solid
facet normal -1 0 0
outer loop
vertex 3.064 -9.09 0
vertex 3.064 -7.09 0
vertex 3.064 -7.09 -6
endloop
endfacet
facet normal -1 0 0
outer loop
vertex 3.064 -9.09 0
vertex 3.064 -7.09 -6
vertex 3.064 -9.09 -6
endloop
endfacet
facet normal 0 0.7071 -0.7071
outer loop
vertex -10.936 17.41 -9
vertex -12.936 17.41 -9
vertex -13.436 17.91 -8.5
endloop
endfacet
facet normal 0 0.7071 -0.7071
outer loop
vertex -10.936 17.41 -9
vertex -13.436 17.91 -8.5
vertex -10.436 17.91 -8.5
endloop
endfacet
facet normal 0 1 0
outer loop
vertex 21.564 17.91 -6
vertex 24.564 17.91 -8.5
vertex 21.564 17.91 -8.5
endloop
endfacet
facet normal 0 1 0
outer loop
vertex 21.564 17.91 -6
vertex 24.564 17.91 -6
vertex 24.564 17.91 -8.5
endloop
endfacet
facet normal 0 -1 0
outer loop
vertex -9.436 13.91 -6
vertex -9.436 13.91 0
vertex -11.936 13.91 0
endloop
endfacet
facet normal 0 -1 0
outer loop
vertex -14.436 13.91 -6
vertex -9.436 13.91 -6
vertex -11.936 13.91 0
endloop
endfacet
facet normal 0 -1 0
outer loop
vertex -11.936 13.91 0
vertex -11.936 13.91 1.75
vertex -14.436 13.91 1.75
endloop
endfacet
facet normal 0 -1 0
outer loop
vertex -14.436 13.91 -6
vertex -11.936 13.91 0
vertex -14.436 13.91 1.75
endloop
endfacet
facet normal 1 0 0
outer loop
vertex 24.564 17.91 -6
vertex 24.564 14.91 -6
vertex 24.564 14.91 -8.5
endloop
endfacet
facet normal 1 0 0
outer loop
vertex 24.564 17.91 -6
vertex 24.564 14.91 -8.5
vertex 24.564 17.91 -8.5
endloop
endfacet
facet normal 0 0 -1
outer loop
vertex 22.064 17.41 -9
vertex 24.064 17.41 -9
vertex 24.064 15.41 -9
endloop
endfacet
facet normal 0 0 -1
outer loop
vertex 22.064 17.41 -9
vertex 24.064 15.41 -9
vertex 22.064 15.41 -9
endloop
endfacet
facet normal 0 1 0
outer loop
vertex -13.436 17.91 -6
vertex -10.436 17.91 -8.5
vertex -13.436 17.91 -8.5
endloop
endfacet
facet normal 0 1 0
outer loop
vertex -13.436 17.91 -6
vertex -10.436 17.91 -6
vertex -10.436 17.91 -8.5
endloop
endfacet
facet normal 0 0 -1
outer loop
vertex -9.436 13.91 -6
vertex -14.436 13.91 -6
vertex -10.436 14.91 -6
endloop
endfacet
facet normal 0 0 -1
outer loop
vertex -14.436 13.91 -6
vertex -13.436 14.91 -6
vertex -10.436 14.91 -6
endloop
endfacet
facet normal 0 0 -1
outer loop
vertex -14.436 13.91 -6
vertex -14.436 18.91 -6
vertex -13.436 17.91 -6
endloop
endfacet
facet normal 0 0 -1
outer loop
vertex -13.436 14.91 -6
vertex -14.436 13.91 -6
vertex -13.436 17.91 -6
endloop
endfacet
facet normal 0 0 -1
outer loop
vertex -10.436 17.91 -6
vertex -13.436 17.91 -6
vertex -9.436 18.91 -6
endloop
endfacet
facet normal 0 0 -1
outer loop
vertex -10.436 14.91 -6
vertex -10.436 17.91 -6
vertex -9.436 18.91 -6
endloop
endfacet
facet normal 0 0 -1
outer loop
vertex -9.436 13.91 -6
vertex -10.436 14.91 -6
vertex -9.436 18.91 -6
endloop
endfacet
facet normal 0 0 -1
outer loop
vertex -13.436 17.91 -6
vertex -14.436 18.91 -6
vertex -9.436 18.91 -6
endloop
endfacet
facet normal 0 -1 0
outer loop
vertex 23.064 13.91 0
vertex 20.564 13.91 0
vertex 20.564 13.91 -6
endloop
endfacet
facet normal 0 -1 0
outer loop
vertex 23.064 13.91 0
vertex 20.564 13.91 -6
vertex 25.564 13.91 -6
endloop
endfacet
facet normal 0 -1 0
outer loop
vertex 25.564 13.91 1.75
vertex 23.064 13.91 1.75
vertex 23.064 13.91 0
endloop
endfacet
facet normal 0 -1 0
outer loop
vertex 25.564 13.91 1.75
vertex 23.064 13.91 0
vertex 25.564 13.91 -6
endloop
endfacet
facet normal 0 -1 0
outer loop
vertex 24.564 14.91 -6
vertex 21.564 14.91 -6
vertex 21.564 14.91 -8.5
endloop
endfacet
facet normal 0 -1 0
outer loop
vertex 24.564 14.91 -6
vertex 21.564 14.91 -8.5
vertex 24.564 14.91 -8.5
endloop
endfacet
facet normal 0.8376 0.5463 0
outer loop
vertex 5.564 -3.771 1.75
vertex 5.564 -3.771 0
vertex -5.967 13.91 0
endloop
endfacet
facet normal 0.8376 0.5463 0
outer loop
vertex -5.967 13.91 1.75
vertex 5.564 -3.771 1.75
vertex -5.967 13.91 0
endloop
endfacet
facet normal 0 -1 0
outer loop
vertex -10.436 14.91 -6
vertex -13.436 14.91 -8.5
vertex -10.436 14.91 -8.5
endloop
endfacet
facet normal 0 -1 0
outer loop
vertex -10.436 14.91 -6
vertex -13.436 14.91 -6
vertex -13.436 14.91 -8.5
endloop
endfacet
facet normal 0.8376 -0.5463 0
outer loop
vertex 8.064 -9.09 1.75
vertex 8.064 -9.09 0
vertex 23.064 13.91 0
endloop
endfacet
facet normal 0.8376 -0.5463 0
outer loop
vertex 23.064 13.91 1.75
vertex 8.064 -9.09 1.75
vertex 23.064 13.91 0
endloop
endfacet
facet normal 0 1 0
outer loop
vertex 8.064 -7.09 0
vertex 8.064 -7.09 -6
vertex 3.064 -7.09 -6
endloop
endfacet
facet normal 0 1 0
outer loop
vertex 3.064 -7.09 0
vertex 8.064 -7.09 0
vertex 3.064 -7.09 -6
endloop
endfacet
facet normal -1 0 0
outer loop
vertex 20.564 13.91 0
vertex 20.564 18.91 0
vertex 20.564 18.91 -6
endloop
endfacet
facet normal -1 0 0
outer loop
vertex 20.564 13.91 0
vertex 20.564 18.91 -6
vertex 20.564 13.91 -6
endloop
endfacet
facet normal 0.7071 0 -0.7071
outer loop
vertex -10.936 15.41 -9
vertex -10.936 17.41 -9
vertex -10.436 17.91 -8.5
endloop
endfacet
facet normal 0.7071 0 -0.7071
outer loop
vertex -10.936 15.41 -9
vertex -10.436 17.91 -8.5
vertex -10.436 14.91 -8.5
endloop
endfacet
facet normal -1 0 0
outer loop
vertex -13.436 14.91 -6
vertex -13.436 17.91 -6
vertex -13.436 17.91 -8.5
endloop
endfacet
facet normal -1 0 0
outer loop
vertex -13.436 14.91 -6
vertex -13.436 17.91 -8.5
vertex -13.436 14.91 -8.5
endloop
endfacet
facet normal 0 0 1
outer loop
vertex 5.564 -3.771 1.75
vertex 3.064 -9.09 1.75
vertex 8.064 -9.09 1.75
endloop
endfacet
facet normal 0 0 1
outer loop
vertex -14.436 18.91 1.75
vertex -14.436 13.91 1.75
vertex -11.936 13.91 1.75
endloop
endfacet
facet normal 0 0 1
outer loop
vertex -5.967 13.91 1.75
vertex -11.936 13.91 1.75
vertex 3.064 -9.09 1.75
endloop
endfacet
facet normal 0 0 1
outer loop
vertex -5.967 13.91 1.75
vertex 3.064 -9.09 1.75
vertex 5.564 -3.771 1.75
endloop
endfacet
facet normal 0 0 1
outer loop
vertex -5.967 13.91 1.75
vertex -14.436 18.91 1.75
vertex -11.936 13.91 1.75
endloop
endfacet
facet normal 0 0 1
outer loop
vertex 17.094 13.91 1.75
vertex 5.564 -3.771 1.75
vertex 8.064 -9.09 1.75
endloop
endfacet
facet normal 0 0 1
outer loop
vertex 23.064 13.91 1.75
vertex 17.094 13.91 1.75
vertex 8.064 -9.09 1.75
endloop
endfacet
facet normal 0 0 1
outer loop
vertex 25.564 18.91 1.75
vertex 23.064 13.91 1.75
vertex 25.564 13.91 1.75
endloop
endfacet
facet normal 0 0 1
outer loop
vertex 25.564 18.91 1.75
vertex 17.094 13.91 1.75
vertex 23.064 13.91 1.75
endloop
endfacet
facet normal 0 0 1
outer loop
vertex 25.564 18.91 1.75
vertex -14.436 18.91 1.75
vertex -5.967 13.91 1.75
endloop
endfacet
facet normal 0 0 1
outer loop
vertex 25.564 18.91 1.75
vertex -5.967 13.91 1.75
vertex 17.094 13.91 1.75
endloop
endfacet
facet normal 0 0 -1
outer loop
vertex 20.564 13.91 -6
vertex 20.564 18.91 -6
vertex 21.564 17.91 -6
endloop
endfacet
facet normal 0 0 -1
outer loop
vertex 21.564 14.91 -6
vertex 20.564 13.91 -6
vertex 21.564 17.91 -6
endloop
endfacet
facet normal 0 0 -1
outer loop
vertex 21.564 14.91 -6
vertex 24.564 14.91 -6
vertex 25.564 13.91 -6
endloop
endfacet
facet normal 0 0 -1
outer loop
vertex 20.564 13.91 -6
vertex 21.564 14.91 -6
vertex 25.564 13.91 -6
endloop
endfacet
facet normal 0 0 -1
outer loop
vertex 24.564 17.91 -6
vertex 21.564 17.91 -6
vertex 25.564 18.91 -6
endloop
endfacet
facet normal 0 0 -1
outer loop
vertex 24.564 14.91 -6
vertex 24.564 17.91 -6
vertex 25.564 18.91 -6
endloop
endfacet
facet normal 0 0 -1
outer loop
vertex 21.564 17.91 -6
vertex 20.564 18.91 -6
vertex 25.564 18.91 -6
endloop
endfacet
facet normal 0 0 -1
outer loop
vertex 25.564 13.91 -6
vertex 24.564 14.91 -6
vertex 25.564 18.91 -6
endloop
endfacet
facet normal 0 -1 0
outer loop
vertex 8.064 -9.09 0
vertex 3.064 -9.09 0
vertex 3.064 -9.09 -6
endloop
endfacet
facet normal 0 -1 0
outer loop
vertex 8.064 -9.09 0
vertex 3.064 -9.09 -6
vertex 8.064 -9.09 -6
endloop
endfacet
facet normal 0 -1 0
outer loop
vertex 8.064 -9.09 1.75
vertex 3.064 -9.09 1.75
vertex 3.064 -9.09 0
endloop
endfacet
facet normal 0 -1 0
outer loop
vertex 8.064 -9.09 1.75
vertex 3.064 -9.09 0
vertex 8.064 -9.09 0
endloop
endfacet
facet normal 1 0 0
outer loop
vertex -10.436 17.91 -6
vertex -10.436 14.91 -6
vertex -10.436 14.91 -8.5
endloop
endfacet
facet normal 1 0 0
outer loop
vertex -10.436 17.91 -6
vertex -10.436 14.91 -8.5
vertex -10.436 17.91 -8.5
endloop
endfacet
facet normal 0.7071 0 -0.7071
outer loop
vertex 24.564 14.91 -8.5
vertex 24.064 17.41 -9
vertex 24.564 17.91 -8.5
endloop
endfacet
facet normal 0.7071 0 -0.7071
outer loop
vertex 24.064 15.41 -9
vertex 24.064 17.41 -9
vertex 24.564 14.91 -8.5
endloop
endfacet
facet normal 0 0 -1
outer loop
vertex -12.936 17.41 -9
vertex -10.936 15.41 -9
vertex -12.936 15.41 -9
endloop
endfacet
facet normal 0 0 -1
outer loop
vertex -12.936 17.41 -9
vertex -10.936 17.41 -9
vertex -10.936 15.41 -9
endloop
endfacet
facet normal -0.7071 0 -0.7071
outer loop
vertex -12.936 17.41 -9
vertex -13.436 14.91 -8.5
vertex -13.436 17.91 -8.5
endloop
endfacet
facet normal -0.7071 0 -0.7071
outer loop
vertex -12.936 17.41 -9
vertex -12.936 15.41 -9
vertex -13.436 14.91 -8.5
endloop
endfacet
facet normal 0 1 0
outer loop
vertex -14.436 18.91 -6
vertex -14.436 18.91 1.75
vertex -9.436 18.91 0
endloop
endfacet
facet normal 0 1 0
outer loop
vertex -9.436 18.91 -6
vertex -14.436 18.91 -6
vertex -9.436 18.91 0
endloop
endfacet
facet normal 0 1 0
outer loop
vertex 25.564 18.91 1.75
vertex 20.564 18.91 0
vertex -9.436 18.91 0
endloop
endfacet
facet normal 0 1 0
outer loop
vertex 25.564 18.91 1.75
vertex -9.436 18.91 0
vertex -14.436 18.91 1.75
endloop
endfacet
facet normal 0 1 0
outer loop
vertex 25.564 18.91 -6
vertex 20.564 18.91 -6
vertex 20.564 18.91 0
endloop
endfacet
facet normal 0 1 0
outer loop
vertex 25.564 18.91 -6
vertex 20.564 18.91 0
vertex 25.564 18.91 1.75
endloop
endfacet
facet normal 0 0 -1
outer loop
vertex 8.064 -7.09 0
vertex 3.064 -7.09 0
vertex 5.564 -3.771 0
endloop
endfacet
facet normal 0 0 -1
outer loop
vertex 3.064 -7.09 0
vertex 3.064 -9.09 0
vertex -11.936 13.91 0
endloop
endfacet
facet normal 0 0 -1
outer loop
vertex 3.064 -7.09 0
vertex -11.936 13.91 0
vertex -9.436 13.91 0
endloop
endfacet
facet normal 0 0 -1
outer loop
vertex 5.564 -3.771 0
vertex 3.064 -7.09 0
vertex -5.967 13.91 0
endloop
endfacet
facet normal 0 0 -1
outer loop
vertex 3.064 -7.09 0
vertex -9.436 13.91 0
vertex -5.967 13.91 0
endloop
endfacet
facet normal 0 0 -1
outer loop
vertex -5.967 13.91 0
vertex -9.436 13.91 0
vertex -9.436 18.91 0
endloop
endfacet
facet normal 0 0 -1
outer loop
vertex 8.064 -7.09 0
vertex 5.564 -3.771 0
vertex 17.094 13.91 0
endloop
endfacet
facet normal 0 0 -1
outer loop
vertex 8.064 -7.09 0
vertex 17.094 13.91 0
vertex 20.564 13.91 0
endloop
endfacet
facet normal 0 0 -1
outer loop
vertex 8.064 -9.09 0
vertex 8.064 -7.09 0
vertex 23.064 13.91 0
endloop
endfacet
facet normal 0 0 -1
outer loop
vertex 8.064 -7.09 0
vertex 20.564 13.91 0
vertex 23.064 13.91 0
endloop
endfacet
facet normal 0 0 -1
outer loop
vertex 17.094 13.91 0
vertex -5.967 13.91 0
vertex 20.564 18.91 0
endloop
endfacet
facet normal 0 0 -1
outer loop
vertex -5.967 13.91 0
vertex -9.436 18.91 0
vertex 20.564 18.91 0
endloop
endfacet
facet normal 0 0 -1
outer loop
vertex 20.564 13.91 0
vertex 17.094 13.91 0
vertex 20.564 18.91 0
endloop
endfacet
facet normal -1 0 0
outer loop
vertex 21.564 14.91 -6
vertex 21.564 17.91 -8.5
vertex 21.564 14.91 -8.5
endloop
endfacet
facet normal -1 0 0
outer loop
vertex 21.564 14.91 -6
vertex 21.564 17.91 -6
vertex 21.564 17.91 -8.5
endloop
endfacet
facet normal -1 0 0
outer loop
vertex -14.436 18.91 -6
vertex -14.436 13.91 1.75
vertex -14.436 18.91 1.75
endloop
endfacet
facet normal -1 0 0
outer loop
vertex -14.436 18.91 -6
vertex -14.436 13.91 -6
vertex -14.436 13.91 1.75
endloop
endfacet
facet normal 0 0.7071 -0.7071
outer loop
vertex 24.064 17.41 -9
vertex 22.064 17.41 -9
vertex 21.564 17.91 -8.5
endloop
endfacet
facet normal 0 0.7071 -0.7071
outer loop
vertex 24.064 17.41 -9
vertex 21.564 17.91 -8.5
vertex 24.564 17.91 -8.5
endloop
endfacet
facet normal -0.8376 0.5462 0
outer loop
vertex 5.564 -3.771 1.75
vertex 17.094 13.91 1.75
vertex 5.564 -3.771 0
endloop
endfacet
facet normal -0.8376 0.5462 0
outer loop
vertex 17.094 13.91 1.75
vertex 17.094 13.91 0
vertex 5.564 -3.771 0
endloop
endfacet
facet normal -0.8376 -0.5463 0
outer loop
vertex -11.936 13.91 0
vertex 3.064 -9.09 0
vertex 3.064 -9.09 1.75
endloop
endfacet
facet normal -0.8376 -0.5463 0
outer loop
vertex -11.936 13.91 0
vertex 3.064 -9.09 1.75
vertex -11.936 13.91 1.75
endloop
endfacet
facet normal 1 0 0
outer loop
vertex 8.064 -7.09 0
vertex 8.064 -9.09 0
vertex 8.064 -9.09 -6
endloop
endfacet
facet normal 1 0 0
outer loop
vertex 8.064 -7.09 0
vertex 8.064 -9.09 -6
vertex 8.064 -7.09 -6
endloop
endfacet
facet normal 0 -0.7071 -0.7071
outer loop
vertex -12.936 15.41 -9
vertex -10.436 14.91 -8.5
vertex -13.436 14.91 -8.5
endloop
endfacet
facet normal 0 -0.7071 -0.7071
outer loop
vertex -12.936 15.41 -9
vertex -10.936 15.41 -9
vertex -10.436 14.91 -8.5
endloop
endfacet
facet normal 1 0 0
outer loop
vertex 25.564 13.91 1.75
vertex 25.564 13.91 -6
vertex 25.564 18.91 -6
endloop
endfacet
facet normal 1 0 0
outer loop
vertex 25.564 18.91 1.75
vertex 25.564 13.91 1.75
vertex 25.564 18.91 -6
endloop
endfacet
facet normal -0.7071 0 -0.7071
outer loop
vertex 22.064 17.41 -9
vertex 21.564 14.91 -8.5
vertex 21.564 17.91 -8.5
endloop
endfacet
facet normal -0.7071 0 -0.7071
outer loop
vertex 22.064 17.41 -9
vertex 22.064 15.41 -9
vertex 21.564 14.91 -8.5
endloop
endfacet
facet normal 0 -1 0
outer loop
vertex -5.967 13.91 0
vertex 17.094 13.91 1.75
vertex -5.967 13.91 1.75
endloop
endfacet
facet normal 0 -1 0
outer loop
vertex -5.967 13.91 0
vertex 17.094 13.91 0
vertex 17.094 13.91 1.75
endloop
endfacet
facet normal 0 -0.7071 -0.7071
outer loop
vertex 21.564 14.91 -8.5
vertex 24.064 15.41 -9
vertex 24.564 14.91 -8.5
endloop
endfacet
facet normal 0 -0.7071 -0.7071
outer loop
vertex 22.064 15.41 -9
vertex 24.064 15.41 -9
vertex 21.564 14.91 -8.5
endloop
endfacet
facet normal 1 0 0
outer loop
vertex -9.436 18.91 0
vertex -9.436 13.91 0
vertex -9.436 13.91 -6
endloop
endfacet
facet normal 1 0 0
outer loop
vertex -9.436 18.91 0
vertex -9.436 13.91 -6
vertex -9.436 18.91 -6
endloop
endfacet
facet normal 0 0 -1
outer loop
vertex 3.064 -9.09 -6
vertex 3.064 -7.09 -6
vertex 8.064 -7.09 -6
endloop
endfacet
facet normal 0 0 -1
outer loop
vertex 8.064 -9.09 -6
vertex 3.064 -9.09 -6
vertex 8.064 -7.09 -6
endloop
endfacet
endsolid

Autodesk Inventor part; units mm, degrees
ref_plane "YZ Plane" through (0, 0, 0) normal (1, 0, 0) x (0, 1, 0)
ref_plane "XZ Plane" through (0, 0, 0) normal (0, 1, 0) x (-1, 0, 0)
ref_plane "XY Plane" through (0, 0, 0) normal (0, 0, 1) x (1, 0, 0)
sketch "Sketch1" plane through (0, 0, 0) normal (0, 0, 1) x (1, 0, 0)
  line L0 (20.5636, -7.0902) -> (-9.4364, -7.0902)
  line L1 (-9.4364, -7.0902) -> (-9.4364, 33.4098)
  line L2 (-9.4364, 33.4098) -> (20.5636, 33.4098)
  line L3 (20.5636, 33.4098) -> (20.5636, -7.0902)
  line L4 (20.5636, 13.9098) -> (-9.4364, 13.9098)
  line L5 (20.5636, 13.9098) -> (25.5636, 13.9098)
  line L6 (25.5636, 13.9098) -> (25.5636, 18.9098)
  line L7 (25.5636, 18.9098) -> (20.5636, 18.9098)
  line L8 (5.5636, -7.0902) -> (5.5636, 33.4098)
  line L9 (-9.4364, 13.9098) -> (-14.4364, 13.9098)
  line L10 (-14.4364, 13.9098) -> (-14.4364, 18.9098)
  line L11 (-14.4364, 18.9098) -> (-9.4364, 18.9098)
  line L12 (3.0636, -7.0902) -> (3.0636, -9.0902)
  line L13 (3.0636, -9.0902) -> (8.0636, -9.0902)
  line L14 (8.0636, -9.0902) -> (8.0636, -7.0902)
  line L15 (3.0636, -9.0902) -> (-11.9364, 13.9098)
  line L16 (8.0636, -9.0902) -> (23.0636, 13.9098)
  line L17 (-9.4364, 18.9098) -> (20.5636, 18.9098)
  line L18 (17.0943, 13.9098) -> (5.5636, -3.7706)
  line L19 (5.5636, -3.7706) -> (-5.967, 13.9098)
  point P0 (0, 0)
  point P1 (20.5636, 9.5176)
  point P2 (-9.4364, 9.5176)
  point P3 (5.5636, -1.9167)
  point P4 (-9.4364, 13.9098)
  dimension "d0" = 30
  dimension "d1" = 40.5
  dimension "d4" = 5
  dimension "d5" = 5
  dimension "d7" = 2
  dimension "d8" = 5
  dimension "d9" = 2.5
  dimension "d12" = 23
  dimension "d15" = 5
extrude "Extrusion1" add sketch "Sketch1" along normal blind 1.75 contours L14 L13 L12 L0 | L0 L8 L18 L4 L3 L16 | L0 L16 L14 | L0 L15 L1 L4 L19 L8 | L12 L15 L0 | L3 L5 L16 | L8 L17 L3 L4 | L4 L1 L17 L8 | L3 L7 L6 L5 | L15 L9 L1 | L9 L10 L11 L1
extrude "Extrusion2" add sketch "Sketch1" against normal blind 6 contours L14 L13 L12 L0
extrude "Extrusion3" add sketch "Sketch1" against normal blind 6 contours L3 L7 L6 L5 | L9 L10 L11 L1
sketch "Sketch3" plane through (0, 0, -6) normal (0, 0, -1) x (-1, 0, 0)
  line L0 (9.4364, 13.9098) -> (14.4364, 13.9098) projected
  line L1 (9.4364, 13.9098) -> (14.4364, 13.9098)
  line L2 (14.4364, 13.9098) -> (14.4364, 18.9098)
  line L3 (14.4364, 18.9098) -> (9.4364, 18.9098)
  line L4 (9.4364, 18.9098) -> (9.4364, 13.9098)
  line L5 (-20.5636, 13.9098) -> (-23.0636, 13.9098) projected
  line L6 (-25.5636, 18.9098) -> (-25.5636, 13.9098) projected
  line L7 (-20.5636, 13.9098) -> (-25.5636, 13.9098)
  line L8 (-25.5636, 13.9098) -> (-25.5636, 18.9098)
  line L9 (-25.5636, 18.9098) -> (-20.5636, 18.9098)
  line L10 (-20.5636, 18.9098) -> (-20.5636, 13.9098)
  line L11 (-21.5636, 14.9098) -> (-24.5636, 14.9098)
  line L12 (-24.5636, 14.9098) -> (-24.5636, 17.9098)
  line L13 (-24.5636, 17.9098) -> (-21.5636, 17.9098)
  line L14 (-21.5636, 17.9098) -> (-21.5636, 14.9098)
  line L15 (13.4364, 17.9098) -> (13.4364, 14.9098)
  line L16 (13.4364, 14.9098) -> (10.4364, 14.9098)
  line L17 (10.4364, 14.9098) -> (10.4364, 17.9098)
  line L18 (10.4364, 17.9098) -> (13.4364, 17.9098)
  point P0 (0, 0)
  dimension "d23" = 1
  dimension "d24" = 1
extrude "Extrusion4" add sketch "Sketch3" along normal blind 3 contours L11 L12 L13 L14 | L15 L16 L17 L18
chamfer "Chamfer2" distance 0.5 angle 45 8 edges at (23.0636, 17.9098, -9) (24.5636, 16.4098, -9) (21.5636, 16.4098, -9) (23.0636, 14.9098, -9) (-13.4364, 16.4098, -9) (-11.9364, 17.9098, -9) (-10.4364, 16.4098, -9) (-11.9364, 14.9098, -9)
equation "\"d5\" = d4"
equation "\"d9\" = 0.5 * d8"
properties part number "BareCalibrationClipBatteryMount"
